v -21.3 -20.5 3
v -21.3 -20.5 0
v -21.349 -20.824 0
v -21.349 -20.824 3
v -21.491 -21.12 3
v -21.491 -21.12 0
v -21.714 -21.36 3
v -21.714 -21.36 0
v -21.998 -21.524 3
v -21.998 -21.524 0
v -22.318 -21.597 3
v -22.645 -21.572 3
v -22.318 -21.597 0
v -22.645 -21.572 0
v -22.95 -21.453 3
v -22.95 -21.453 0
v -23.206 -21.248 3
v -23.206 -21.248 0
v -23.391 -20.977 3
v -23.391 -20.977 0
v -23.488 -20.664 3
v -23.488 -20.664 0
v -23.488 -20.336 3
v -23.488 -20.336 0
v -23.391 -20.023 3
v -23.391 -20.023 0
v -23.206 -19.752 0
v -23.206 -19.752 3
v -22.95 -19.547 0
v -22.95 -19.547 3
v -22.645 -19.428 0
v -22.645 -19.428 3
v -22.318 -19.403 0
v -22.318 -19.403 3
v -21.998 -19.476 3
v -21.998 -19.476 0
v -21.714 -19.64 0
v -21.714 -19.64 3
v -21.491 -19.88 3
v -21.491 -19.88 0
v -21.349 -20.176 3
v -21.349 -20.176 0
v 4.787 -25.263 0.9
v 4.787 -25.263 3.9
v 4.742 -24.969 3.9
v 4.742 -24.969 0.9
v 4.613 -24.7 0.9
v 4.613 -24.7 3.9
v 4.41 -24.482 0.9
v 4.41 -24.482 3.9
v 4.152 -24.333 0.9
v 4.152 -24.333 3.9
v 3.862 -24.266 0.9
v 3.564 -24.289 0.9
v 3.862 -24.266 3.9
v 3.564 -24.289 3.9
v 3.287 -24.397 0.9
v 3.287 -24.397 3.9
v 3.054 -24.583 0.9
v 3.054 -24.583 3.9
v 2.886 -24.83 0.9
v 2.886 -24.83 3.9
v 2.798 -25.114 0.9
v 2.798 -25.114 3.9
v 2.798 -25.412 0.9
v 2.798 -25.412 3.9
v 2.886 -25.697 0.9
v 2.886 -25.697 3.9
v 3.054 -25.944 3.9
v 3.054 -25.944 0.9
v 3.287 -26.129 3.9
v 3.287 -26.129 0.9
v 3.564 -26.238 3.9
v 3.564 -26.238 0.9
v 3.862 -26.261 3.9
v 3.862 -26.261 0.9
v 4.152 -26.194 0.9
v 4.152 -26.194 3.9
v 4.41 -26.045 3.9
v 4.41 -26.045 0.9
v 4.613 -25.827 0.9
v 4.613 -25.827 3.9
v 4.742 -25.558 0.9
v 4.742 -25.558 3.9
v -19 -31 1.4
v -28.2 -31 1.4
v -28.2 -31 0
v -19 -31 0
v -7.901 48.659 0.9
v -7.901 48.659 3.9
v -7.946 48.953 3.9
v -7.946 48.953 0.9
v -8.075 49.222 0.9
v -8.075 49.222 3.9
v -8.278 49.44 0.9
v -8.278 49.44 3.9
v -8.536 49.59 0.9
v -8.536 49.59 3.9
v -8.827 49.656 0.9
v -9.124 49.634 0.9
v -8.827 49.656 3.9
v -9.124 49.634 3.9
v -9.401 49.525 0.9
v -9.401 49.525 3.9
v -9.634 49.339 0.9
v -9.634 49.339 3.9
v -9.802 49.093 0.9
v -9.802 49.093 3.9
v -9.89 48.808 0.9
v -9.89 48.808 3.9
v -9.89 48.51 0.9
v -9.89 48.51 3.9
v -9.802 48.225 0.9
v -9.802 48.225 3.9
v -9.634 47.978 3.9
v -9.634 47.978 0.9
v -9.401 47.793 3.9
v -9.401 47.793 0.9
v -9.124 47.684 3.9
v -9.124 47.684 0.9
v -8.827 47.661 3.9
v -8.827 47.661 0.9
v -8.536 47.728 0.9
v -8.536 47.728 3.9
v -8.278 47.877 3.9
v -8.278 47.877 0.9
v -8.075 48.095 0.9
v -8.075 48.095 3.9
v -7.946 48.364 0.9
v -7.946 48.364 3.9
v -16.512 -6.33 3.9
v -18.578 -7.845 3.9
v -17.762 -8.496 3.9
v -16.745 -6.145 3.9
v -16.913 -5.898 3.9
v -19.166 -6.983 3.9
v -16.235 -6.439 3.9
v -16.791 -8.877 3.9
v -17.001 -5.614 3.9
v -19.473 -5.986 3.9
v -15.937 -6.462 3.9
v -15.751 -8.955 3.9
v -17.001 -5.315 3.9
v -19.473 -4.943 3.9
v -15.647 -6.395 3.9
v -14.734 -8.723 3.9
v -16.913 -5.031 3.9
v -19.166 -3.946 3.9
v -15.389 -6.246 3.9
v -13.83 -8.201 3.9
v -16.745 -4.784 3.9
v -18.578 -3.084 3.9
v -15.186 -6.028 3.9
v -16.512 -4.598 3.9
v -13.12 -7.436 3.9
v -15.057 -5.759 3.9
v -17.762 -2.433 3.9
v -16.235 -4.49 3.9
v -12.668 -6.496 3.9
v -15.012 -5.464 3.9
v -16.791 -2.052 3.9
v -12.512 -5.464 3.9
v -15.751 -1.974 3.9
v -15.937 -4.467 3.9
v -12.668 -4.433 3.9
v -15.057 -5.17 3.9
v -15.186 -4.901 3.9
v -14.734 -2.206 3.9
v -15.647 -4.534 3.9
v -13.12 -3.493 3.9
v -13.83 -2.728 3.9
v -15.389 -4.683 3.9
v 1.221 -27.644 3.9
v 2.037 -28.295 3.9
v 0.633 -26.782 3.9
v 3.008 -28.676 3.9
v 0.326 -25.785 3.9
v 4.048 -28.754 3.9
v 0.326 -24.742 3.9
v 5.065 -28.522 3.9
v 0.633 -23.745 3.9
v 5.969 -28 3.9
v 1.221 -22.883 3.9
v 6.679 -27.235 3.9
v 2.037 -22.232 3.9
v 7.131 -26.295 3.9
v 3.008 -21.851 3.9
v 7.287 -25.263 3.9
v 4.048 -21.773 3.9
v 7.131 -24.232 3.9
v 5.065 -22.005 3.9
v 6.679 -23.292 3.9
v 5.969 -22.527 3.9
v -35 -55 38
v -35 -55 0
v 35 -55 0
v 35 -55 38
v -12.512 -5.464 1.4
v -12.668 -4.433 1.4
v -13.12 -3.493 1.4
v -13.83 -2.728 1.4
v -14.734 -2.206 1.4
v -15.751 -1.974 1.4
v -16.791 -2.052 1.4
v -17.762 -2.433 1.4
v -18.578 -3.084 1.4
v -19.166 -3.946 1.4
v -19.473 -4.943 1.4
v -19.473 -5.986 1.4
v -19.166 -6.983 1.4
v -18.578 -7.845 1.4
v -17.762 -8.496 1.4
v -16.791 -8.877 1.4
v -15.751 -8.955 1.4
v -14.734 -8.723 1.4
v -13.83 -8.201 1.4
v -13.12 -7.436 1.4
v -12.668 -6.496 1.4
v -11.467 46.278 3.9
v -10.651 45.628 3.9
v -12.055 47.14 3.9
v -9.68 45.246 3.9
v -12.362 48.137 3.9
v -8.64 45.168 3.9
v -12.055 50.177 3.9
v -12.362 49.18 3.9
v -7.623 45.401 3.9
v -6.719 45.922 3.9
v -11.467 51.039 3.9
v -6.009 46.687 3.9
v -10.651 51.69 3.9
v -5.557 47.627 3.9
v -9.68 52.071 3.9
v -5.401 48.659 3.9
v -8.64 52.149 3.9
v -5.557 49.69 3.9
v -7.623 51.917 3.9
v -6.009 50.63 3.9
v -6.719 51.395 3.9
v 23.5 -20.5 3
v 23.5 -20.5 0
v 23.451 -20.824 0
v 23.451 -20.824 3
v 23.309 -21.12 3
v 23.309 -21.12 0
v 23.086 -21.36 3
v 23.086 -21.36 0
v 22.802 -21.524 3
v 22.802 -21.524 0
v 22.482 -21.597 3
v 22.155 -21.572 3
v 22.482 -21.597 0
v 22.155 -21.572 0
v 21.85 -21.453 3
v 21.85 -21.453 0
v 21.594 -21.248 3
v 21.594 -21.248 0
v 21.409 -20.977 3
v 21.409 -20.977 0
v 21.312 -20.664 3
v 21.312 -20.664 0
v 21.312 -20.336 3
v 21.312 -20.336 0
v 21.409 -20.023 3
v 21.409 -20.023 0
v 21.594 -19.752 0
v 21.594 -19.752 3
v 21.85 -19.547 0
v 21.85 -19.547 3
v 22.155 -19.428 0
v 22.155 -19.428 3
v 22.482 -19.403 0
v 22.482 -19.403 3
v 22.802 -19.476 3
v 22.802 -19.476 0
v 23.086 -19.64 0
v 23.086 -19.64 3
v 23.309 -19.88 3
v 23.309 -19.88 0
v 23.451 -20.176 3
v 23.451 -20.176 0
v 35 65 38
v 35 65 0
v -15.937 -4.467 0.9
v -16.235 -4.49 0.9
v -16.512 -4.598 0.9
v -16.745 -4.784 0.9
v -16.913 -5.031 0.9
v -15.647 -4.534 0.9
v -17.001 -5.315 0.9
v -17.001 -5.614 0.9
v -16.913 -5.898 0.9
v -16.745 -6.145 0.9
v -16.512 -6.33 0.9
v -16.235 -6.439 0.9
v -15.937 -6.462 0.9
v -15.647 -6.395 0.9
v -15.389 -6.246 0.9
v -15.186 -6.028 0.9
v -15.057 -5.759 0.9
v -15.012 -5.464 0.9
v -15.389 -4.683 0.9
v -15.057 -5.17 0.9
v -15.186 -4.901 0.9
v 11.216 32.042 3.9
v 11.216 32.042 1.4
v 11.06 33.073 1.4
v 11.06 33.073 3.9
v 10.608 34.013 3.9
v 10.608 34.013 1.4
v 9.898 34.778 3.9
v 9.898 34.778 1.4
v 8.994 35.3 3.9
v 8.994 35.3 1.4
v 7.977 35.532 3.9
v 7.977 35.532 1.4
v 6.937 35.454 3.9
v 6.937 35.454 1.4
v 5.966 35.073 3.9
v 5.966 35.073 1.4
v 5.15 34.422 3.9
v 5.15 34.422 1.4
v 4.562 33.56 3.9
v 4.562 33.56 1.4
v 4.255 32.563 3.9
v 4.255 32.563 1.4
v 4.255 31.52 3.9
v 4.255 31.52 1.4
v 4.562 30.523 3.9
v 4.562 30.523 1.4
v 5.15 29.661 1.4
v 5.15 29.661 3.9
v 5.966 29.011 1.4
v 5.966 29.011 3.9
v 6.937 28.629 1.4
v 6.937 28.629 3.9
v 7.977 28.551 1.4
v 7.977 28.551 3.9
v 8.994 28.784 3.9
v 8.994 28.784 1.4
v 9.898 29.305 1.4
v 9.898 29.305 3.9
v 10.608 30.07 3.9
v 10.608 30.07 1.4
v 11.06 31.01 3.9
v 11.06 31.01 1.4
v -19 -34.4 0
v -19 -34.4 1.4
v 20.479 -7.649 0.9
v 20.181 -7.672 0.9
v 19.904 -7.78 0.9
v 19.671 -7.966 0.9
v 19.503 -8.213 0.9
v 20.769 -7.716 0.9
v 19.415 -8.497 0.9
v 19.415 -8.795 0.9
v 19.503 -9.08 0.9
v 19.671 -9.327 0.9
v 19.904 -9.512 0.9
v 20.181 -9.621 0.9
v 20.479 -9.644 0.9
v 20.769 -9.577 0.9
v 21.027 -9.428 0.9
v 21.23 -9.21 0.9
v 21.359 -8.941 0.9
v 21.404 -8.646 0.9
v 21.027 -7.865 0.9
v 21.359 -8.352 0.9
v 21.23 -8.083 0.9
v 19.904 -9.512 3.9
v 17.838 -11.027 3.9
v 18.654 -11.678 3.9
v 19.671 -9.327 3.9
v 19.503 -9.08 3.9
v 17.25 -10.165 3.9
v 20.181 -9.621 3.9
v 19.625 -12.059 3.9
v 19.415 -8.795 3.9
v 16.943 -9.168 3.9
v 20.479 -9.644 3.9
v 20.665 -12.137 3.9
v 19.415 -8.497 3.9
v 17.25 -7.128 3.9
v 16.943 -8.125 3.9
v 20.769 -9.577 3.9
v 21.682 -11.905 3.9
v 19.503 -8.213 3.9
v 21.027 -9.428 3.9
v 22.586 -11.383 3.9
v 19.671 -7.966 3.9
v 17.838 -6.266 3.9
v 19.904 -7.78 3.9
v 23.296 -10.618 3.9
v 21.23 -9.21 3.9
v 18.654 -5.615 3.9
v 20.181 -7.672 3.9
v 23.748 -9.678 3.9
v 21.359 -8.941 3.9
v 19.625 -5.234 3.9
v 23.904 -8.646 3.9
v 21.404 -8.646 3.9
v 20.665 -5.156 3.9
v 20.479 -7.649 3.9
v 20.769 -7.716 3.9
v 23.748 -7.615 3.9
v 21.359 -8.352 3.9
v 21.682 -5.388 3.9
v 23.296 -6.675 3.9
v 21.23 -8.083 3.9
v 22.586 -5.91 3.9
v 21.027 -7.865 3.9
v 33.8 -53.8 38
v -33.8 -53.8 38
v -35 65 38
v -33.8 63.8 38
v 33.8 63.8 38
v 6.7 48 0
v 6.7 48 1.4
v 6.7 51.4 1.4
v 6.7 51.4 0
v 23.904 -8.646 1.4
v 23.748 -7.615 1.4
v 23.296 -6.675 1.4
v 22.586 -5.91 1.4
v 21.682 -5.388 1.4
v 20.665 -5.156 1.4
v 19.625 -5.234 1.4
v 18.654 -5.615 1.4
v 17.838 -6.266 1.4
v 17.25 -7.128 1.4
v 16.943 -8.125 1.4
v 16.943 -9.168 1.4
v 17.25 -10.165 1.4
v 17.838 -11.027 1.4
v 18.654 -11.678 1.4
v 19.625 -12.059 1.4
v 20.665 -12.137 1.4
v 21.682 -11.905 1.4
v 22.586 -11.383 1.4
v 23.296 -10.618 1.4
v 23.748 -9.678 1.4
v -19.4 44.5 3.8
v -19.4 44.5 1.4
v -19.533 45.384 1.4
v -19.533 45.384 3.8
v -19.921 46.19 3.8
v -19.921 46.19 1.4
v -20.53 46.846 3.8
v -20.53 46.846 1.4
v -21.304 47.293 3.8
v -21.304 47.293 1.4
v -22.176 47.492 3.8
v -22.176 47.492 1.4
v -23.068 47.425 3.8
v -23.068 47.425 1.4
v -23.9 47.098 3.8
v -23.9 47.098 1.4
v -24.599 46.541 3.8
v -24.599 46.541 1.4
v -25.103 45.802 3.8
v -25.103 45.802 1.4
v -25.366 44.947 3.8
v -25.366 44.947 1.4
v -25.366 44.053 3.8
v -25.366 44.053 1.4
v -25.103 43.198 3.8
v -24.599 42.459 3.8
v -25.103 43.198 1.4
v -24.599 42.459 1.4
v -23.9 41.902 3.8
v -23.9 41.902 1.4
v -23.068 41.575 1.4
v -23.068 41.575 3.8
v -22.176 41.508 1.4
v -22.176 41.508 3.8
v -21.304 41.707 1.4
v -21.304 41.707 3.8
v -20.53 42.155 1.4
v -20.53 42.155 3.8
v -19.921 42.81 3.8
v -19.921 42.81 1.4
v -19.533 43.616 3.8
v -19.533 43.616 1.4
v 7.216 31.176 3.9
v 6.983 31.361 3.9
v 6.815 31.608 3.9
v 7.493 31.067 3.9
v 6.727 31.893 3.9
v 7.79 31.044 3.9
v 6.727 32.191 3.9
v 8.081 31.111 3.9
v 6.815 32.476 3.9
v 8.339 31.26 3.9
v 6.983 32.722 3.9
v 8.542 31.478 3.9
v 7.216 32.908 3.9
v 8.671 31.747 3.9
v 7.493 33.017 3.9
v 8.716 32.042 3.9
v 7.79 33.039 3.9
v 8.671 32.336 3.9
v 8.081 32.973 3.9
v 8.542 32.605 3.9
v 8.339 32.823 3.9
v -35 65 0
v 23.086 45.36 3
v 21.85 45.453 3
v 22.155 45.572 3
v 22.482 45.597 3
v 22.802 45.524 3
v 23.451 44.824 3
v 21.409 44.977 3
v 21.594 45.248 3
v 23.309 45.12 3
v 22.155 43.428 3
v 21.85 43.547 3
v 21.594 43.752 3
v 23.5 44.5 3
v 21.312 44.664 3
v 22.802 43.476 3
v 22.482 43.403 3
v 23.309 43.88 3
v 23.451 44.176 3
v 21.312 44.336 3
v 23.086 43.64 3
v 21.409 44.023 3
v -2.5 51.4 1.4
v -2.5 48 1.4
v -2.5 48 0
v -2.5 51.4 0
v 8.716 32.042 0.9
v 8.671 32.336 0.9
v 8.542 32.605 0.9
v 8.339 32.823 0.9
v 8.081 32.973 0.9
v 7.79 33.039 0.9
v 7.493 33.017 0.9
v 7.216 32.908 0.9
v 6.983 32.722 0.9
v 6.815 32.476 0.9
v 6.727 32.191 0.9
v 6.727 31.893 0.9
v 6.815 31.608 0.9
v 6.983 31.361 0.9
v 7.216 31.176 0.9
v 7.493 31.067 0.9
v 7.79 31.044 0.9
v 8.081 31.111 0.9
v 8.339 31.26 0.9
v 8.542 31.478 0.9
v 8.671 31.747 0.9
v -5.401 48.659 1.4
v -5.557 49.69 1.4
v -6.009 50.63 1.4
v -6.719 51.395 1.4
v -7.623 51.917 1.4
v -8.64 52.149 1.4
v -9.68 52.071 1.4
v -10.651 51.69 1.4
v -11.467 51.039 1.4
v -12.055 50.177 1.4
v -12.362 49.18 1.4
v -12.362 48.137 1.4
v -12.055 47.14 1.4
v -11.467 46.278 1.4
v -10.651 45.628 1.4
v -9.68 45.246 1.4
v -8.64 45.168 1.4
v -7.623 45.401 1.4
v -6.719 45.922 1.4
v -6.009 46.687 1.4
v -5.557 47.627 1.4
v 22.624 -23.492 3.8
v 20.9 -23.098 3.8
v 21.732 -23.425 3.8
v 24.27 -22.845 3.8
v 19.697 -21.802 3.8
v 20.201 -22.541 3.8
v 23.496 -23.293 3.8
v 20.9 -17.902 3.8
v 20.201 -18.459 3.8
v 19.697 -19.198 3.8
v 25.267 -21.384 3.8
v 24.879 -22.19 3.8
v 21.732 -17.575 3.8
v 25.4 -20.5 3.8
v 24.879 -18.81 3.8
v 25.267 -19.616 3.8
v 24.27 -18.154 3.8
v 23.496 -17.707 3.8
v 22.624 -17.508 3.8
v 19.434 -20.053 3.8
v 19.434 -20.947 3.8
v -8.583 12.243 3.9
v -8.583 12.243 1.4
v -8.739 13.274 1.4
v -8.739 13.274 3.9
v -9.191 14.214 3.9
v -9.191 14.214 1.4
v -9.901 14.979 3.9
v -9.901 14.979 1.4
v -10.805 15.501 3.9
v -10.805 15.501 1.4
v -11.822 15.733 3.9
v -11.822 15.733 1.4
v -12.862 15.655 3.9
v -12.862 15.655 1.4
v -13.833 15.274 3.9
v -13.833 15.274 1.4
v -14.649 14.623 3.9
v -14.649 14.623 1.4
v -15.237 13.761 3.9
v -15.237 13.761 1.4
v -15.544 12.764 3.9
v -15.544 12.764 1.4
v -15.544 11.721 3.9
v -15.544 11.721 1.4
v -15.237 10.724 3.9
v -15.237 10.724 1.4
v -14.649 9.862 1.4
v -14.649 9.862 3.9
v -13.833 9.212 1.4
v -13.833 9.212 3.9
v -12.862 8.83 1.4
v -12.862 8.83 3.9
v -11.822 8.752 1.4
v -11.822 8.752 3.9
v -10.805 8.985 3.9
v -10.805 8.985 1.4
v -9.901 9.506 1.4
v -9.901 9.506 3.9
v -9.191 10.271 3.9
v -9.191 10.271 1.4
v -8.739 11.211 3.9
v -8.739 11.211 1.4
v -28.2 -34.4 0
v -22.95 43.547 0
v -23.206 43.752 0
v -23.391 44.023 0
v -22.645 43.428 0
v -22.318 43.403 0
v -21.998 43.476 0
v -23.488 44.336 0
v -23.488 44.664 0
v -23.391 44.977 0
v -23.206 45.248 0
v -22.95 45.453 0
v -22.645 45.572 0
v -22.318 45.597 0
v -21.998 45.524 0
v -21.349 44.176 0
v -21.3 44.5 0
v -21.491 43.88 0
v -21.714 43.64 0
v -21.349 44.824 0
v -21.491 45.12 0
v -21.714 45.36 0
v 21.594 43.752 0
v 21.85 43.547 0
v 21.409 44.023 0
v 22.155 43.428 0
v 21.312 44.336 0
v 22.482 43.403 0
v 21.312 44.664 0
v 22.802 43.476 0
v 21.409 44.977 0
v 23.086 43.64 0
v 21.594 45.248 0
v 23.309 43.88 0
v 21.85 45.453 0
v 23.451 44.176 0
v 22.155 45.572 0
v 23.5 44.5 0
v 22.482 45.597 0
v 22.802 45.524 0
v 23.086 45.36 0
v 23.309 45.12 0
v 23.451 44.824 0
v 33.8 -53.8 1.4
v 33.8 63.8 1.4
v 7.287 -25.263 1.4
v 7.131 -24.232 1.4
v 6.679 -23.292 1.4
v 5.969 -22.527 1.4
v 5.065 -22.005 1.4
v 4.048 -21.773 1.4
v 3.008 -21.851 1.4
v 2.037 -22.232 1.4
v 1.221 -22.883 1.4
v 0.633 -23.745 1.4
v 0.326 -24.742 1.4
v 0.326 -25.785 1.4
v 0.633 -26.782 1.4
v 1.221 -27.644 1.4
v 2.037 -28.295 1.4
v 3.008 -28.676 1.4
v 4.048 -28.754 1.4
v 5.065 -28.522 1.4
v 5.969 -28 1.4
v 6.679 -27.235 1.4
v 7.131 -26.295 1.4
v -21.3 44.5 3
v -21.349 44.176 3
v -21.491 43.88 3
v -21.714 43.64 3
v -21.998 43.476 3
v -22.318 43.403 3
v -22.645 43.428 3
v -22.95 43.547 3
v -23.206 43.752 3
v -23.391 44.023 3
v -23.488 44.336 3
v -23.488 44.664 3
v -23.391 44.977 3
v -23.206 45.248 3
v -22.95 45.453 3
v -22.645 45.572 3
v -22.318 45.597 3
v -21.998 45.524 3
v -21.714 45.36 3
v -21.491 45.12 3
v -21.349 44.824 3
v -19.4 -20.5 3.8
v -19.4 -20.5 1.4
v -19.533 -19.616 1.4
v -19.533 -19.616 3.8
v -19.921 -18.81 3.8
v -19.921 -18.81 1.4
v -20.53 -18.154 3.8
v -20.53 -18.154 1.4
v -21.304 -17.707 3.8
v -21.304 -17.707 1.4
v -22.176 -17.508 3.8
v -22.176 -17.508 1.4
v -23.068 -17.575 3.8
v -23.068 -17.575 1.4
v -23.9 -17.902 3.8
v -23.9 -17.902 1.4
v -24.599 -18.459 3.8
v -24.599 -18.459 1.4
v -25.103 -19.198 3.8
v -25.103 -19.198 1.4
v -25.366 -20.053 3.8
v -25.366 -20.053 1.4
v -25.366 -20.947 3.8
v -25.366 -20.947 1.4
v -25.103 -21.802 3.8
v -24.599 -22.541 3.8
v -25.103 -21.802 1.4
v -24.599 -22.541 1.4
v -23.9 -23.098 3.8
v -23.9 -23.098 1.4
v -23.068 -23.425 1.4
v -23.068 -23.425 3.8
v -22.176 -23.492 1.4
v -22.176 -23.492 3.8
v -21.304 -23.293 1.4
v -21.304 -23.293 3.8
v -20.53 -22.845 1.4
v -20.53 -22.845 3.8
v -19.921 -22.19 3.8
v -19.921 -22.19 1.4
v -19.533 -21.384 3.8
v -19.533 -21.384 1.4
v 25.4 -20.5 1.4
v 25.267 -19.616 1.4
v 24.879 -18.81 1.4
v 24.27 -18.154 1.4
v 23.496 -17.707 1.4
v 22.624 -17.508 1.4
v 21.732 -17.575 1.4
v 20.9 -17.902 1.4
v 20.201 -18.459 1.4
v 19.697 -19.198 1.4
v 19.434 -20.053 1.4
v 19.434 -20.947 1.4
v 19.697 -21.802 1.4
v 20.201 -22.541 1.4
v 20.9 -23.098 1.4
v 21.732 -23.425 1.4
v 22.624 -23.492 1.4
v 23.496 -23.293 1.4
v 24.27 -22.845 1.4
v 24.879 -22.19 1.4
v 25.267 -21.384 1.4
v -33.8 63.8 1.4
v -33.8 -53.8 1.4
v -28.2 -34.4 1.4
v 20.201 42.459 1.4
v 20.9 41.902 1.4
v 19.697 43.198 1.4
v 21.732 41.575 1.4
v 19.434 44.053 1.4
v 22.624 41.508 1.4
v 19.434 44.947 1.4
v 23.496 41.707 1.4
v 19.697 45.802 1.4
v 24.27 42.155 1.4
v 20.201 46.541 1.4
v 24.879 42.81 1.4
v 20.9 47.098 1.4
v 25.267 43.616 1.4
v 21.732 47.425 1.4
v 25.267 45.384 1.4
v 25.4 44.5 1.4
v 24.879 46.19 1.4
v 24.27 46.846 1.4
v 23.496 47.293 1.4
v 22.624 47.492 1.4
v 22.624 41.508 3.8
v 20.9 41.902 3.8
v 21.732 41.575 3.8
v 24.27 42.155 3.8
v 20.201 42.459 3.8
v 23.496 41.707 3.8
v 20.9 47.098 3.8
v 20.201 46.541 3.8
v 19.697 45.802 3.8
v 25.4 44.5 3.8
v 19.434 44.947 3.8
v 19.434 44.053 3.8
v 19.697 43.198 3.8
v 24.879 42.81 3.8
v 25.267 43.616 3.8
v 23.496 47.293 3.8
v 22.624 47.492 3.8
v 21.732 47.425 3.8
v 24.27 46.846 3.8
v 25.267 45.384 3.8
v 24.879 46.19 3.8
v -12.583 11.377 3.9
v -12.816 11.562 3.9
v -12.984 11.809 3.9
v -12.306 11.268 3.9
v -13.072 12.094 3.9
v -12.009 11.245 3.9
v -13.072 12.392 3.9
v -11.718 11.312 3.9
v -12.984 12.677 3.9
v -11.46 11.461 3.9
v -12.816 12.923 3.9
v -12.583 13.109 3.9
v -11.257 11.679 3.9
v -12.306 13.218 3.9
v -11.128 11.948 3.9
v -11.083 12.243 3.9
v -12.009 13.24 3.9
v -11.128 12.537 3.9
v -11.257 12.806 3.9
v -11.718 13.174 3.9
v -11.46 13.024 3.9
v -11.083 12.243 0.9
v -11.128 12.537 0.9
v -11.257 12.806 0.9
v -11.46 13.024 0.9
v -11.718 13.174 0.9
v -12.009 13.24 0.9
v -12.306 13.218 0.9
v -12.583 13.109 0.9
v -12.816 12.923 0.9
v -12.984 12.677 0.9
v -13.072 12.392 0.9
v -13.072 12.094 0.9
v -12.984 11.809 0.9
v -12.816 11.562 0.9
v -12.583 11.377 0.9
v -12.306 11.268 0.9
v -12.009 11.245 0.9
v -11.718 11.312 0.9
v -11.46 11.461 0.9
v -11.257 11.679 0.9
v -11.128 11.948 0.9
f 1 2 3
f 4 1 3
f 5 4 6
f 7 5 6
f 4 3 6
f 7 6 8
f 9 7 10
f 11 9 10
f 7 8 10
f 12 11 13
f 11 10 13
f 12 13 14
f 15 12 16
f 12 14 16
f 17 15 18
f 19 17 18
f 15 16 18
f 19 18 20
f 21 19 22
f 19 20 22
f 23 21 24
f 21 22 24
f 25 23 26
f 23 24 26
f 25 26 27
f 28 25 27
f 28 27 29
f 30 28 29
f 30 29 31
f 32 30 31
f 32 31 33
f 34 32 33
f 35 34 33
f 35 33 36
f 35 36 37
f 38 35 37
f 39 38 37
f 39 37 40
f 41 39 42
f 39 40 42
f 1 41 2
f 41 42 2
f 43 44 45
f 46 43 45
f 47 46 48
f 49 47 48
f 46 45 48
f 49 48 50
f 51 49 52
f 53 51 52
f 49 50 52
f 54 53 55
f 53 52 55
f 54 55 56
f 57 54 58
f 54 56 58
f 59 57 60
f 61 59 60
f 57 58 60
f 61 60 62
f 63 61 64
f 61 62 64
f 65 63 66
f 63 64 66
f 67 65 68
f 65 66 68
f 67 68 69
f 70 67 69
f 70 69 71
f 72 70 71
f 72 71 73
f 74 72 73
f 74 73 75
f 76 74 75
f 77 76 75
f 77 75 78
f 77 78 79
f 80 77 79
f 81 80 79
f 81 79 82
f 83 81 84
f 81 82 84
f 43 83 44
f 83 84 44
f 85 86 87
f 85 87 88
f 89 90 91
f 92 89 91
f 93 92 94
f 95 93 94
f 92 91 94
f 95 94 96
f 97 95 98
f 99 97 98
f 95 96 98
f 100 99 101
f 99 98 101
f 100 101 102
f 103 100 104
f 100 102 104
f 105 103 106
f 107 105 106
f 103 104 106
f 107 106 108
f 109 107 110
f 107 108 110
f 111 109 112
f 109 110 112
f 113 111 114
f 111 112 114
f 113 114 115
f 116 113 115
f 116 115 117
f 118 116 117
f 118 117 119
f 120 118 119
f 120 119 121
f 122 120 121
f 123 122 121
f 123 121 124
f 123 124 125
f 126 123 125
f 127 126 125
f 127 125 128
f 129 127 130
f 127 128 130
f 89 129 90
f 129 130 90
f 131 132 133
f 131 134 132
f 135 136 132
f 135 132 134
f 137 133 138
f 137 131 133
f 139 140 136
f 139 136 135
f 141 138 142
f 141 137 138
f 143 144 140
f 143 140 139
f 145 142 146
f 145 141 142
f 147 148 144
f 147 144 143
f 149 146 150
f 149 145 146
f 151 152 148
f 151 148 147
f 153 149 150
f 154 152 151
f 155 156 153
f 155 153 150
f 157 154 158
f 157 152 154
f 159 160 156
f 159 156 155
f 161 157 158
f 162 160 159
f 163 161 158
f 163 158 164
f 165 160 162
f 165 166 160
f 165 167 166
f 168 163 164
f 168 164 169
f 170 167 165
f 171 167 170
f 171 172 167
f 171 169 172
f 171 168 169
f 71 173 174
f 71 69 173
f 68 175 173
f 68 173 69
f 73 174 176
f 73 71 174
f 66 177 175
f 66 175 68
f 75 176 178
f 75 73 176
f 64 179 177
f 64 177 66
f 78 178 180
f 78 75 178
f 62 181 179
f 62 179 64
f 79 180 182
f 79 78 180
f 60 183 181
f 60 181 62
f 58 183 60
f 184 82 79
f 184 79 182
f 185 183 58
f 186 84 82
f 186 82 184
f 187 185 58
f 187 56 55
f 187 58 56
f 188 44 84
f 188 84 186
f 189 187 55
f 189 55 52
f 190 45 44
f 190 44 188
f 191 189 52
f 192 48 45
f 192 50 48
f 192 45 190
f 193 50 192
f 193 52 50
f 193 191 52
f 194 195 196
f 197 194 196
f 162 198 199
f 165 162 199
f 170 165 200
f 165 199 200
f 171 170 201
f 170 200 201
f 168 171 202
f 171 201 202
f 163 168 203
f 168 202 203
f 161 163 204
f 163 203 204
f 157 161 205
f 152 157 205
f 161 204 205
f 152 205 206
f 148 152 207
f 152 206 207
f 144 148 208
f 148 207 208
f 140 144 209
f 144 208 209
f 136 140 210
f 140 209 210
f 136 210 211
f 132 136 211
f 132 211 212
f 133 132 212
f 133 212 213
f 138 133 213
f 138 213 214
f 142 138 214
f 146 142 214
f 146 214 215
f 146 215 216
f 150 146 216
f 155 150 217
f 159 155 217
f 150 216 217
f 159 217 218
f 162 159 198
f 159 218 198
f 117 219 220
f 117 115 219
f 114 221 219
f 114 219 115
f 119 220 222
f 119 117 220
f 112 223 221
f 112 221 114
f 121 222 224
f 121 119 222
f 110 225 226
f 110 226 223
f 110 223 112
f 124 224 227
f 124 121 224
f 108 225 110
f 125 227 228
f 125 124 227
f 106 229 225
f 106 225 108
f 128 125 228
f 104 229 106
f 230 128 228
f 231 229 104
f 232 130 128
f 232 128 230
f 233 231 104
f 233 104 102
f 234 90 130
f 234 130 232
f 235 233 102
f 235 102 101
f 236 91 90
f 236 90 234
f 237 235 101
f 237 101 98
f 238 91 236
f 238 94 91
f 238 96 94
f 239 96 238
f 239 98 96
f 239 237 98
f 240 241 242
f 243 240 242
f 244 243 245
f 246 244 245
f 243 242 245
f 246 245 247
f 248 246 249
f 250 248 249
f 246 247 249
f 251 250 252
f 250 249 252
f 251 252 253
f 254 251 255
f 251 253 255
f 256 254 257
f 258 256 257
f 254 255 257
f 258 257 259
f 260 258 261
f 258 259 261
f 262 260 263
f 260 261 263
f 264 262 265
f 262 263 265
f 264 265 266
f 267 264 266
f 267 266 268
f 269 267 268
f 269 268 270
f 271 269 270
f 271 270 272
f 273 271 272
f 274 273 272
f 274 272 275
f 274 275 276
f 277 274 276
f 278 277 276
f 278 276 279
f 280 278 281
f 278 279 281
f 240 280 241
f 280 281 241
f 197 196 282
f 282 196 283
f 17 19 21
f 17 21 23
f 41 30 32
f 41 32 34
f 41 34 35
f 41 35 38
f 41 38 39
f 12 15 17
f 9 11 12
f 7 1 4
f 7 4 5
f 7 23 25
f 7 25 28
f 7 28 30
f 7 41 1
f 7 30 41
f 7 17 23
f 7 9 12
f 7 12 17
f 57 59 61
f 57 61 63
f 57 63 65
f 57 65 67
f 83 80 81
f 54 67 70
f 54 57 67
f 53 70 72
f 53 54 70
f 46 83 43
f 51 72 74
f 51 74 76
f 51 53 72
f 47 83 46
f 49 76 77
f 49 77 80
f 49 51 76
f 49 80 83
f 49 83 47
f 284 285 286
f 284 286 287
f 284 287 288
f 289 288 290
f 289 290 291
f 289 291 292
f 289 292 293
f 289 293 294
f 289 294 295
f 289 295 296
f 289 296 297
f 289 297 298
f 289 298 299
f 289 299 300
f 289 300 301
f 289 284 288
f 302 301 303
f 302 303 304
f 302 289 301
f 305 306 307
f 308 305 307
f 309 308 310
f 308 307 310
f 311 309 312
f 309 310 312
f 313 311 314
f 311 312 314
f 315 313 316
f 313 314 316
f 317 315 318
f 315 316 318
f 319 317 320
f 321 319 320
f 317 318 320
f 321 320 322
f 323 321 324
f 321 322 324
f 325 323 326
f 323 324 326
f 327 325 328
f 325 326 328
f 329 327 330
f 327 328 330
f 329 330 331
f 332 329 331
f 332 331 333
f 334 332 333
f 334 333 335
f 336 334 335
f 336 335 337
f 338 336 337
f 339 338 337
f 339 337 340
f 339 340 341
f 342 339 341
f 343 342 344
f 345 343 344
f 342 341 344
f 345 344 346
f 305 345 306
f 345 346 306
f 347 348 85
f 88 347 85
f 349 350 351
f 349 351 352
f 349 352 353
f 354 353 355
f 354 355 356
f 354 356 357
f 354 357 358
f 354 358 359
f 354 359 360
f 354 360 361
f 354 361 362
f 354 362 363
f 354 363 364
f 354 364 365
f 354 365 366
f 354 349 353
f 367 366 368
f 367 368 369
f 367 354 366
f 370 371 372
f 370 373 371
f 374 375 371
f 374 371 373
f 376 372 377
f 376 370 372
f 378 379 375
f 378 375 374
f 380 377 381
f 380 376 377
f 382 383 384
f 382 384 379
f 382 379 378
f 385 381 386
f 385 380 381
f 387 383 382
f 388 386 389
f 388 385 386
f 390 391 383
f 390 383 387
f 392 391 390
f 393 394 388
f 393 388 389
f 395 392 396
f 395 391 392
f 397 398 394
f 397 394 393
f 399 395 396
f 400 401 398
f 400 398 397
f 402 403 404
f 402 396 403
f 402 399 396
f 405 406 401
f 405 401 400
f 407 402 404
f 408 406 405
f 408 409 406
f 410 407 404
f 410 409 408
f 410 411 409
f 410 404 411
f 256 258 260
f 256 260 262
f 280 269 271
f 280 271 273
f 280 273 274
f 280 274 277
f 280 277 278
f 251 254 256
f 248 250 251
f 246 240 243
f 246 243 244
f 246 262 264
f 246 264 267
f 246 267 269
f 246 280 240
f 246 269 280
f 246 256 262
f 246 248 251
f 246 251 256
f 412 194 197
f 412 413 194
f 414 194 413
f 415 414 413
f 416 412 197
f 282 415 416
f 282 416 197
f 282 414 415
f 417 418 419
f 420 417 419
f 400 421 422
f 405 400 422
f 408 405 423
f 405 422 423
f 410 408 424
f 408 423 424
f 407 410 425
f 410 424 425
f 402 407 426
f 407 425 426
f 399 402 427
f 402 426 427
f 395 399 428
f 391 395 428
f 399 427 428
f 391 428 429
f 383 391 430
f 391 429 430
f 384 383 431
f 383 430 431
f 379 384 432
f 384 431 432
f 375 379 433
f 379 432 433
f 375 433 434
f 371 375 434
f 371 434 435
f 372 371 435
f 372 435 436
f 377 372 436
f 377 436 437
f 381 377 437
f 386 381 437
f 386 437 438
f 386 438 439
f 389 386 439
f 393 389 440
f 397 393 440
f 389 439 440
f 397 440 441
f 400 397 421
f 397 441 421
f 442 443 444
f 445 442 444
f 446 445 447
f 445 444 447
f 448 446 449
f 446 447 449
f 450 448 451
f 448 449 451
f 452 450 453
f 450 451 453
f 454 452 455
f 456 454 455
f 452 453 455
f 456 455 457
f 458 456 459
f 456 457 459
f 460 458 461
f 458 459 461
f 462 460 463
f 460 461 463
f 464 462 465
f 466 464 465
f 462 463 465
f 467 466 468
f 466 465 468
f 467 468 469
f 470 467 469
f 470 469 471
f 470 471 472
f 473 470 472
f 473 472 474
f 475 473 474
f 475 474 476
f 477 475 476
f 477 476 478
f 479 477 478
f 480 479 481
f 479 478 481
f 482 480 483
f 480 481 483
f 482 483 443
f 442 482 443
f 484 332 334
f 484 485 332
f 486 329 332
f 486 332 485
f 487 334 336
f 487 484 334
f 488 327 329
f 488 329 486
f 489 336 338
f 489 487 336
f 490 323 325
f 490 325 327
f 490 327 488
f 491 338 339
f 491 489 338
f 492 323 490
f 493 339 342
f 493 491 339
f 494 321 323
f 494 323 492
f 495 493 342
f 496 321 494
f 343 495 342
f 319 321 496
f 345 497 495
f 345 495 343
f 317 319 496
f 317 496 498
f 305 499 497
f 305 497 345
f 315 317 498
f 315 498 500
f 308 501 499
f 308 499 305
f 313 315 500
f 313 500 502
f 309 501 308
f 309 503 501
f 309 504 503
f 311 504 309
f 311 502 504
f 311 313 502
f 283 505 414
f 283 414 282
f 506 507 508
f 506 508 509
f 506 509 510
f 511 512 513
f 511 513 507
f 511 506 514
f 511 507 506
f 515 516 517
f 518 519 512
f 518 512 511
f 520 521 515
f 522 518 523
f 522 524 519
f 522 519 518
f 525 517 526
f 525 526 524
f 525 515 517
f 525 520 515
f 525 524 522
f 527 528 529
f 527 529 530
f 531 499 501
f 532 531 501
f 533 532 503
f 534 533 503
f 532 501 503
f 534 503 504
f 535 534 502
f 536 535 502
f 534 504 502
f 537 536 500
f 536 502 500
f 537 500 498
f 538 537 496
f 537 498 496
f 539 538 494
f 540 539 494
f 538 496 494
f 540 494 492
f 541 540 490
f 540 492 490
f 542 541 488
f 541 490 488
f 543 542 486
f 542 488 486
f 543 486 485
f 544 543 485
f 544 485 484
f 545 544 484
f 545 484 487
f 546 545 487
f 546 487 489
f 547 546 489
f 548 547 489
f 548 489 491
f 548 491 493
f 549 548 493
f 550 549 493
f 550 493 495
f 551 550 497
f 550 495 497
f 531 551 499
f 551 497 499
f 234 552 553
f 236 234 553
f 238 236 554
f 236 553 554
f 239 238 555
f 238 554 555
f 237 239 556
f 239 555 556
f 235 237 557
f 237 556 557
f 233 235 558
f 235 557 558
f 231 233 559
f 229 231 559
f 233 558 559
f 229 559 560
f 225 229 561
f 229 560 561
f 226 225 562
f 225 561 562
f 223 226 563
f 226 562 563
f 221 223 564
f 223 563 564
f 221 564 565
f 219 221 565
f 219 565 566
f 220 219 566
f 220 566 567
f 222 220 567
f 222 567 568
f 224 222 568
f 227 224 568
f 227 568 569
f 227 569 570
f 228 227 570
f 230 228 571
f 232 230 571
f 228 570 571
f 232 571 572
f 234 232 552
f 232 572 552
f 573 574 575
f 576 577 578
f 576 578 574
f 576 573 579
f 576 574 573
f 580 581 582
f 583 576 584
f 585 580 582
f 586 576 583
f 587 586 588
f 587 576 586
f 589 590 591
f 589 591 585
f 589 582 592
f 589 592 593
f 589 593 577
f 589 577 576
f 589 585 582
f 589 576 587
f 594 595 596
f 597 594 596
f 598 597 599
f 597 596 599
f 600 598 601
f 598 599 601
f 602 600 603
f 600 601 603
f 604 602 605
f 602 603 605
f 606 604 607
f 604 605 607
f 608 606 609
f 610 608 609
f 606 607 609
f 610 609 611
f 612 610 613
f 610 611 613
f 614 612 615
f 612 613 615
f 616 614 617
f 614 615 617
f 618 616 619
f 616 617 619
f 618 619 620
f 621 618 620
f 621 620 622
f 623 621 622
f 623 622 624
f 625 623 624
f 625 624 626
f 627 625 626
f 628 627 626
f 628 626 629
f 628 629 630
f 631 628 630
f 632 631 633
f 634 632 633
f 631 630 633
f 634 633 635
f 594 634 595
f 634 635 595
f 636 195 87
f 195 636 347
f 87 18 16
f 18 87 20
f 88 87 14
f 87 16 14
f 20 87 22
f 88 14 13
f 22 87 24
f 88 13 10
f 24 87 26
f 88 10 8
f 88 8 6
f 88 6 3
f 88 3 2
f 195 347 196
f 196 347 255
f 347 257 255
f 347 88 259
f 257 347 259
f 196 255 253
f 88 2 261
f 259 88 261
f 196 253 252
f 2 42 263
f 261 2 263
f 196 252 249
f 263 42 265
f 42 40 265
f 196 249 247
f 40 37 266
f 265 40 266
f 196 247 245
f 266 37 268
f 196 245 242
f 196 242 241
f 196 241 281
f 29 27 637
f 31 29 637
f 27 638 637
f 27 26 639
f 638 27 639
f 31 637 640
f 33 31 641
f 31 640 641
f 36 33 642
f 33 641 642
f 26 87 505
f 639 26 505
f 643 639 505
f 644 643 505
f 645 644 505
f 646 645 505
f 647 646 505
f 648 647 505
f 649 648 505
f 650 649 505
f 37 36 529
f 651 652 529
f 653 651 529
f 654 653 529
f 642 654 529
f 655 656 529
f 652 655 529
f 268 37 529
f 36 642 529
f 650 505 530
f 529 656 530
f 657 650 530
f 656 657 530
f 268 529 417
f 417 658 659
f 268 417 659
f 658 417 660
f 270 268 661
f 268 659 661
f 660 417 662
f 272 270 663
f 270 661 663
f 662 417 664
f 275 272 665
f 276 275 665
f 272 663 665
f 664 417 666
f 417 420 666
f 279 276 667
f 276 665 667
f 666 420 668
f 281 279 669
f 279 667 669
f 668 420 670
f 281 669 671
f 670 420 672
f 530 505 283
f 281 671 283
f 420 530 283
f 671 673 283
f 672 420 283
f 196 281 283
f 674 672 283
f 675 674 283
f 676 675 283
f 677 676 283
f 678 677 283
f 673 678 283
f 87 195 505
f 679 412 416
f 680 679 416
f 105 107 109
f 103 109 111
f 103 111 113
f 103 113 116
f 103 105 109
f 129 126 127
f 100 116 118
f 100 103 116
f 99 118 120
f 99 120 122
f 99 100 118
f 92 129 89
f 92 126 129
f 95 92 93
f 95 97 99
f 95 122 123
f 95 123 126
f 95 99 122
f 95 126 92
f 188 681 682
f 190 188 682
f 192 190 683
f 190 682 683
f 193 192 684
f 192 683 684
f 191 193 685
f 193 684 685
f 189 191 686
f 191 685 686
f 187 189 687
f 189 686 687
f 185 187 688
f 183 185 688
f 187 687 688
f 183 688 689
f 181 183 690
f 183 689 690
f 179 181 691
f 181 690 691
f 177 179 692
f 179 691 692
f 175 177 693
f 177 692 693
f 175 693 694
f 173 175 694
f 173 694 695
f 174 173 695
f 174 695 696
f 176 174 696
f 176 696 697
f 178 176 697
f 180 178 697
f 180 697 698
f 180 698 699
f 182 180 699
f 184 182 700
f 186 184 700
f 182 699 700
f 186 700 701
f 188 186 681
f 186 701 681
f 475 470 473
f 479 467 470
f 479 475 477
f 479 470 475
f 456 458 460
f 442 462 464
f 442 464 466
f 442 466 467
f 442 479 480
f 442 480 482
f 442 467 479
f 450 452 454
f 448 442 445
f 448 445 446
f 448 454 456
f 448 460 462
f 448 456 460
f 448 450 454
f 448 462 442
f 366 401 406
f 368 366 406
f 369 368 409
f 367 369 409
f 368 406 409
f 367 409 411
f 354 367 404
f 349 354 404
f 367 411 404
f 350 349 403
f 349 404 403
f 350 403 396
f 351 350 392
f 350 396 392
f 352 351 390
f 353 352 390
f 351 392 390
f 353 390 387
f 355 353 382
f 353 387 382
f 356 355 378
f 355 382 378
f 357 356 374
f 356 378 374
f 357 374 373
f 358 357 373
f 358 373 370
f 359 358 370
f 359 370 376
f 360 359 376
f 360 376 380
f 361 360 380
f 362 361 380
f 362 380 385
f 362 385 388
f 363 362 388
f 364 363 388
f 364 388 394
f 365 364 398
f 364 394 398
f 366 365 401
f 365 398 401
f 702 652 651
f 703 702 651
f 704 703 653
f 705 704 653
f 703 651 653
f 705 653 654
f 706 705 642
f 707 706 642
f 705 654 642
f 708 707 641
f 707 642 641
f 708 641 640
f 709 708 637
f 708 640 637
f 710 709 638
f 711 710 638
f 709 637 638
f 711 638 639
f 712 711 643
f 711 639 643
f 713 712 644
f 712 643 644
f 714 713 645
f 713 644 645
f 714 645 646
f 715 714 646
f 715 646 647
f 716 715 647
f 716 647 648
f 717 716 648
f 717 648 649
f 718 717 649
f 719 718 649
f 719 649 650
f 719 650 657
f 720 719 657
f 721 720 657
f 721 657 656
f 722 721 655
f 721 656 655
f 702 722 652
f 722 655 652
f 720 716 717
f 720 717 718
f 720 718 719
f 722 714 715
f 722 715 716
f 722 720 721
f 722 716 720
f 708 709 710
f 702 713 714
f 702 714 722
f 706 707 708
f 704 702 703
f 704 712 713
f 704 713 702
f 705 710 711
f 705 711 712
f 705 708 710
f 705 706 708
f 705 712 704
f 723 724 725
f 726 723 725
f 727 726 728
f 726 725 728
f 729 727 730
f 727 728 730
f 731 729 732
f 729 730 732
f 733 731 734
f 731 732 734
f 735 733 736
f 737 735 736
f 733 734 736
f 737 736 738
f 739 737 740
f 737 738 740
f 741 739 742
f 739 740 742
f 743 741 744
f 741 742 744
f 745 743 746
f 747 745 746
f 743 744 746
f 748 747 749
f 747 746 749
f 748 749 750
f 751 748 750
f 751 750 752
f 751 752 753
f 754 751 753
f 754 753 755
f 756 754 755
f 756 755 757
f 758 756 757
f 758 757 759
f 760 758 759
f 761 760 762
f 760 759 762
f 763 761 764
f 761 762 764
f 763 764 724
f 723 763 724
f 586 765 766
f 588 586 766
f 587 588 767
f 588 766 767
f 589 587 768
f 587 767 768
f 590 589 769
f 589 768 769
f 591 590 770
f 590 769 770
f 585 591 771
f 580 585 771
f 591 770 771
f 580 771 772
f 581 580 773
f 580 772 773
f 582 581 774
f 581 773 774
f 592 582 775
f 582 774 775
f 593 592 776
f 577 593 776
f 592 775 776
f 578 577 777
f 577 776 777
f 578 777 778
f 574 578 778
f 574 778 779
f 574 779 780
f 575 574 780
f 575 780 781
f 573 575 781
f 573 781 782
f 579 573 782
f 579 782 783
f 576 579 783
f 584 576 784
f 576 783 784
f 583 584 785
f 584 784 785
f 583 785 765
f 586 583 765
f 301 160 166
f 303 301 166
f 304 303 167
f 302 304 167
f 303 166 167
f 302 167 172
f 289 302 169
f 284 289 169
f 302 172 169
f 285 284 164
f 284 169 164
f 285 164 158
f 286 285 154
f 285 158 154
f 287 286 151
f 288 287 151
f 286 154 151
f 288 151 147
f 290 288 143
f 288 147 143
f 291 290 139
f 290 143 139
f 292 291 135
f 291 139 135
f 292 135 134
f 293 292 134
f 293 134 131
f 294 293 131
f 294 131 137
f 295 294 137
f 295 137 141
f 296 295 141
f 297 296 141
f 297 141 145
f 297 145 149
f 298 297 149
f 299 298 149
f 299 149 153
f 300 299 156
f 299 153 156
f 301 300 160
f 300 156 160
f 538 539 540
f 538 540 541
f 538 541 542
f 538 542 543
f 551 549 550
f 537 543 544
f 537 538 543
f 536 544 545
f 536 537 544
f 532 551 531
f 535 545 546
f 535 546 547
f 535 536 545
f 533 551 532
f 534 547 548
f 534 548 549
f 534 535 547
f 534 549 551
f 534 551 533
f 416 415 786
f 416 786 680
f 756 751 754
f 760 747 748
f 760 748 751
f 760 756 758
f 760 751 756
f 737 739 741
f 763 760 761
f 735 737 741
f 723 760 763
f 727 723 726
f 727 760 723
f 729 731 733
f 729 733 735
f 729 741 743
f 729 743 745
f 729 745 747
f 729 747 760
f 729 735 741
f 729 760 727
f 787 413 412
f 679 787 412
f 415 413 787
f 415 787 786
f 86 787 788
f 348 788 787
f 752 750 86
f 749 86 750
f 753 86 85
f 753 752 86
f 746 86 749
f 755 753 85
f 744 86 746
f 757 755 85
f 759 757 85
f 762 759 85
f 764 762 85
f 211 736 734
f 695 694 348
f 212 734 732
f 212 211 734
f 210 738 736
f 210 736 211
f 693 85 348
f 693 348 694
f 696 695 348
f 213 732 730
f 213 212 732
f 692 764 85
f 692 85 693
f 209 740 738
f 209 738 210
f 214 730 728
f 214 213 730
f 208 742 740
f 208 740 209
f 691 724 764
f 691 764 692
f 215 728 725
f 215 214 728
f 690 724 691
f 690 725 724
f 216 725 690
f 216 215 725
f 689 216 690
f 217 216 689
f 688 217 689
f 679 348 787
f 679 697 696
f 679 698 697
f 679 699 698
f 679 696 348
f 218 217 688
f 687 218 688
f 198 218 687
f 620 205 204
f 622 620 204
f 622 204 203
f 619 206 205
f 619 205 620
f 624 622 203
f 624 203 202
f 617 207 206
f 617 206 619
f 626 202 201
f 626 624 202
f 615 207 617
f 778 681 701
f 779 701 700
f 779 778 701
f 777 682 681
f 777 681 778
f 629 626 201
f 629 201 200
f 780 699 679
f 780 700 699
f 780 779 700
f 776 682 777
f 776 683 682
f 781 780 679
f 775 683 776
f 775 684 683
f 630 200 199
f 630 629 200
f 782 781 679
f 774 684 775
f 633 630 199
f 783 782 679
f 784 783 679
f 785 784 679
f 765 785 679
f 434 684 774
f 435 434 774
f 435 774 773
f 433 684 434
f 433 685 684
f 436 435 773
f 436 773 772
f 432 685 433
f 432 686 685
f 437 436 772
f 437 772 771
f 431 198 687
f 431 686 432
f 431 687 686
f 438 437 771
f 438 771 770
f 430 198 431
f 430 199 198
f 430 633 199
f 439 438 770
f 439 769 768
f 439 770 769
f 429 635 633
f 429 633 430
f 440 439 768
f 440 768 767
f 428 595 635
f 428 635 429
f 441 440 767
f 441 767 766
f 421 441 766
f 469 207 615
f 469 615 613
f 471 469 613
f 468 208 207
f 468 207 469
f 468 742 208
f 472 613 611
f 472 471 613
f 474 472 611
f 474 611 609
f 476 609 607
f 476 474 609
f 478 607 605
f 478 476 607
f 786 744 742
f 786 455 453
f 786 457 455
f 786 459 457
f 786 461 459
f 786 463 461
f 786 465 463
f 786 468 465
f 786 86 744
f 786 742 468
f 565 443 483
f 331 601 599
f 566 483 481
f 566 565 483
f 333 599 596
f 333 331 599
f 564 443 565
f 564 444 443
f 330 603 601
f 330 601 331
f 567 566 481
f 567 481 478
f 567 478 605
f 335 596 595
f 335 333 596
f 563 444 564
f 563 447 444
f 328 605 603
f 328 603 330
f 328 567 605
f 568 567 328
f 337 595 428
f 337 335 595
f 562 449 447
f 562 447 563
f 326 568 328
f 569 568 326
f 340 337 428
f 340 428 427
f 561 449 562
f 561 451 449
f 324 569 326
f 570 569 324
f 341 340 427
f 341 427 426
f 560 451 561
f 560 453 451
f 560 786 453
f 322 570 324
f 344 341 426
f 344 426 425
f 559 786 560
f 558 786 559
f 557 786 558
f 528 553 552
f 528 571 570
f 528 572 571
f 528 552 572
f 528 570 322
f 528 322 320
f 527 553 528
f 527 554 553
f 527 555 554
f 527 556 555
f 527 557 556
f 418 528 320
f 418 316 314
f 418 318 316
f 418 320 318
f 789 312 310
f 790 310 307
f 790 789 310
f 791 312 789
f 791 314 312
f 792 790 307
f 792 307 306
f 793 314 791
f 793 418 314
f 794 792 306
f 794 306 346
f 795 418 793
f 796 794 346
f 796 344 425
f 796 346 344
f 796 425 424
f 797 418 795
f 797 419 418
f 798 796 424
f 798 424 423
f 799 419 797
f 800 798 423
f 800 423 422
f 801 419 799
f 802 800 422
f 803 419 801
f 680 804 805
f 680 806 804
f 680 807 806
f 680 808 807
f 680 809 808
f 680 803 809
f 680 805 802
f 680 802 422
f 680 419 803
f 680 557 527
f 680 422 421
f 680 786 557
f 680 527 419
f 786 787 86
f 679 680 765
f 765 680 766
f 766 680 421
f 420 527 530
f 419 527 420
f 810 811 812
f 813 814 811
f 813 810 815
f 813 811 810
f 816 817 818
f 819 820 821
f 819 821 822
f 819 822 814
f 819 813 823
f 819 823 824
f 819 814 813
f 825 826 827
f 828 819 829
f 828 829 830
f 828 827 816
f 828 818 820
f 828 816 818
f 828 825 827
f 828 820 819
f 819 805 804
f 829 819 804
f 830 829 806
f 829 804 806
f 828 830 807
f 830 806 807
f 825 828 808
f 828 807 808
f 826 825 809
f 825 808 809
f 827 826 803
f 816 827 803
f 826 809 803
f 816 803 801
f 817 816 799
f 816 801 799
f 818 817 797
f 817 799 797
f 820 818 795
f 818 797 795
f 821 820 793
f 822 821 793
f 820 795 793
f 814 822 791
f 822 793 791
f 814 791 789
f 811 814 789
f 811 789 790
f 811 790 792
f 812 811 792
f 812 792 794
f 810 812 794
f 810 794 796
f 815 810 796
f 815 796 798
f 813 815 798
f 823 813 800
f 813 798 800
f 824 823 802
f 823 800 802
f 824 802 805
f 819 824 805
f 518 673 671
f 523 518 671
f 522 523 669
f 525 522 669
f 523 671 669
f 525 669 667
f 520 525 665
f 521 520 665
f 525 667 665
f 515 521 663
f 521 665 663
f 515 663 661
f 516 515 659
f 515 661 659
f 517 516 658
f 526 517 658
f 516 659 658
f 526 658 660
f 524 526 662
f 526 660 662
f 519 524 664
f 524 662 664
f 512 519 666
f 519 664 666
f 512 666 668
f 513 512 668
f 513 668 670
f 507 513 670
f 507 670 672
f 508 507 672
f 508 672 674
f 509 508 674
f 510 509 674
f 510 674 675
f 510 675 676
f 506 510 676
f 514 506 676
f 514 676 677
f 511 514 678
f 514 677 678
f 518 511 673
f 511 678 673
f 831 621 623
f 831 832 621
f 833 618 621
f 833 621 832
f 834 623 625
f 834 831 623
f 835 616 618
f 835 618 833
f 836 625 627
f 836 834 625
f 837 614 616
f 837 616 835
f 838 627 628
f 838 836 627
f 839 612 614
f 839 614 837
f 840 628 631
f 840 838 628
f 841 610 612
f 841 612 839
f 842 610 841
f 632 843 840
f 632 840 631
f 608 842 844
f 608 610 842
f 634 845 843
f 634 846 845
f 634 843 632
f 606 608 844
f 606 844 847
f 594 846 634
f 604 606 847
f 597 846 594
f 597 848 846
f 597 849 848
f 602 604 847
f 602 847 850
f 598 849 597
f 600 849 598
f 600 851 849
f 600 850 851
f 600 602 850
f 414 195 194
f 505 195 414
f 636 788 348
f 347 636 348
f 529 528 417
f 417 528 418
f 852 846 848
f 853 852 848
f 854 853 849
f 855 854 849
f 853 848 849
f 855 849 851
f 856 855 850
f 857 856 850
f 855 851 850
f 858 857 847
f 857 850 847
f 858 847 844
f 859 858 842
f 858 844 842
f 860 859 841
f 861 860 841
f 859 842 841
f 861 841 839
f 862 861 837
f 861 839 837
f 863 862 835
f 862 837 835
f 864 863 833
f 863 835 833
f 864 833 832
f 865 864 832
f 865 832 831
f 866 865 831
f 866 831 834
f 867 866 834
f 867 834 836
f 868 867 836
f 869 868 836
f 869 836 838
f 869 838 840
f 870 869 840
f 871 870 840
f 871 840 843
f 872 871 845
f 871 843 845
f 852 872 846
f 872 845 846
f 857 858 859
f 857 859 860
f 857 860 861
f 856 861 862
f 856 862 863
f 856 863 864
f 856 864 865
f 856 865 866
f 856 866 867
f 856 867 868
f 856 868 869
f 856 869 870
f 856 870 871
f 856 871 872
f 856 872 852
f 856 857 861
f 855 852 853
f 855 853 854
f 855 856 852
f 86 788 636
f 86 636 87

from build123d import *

# Parameters (mm, degrees)
SKETCH_W        = 70
SKETCH_H        = 120
PAD_DEPTH       = 38
SKETCH001_W     = 67.6
SKETCH001_H     = 117.6
POCKET_DEPTH    = 36.6
SKETCH112_R     = 3
PAD080_DEPTH    = 2.4
SKETCH113_R     = 1.1
POCKET031_DEPTH = 3
SKETCH136_R     = 3.5
PAD096_DEPTH    = 2.5
SKETCH137_R     = 1
POCKET039_DEPTH = 3
SKETCH138_W     = 9.2
SKETCH138_H     = 3.4
POCKET040_DEPTH = 1.401


with BuildPart() as part:
    # Sketch → Pad (new body)
    with BuildSketch(Plane.XY):
        Rectangle(SKETCH_W, SKETCH_H)
    extrude(amount=PAD_DEPTH)

    # Sketch001 (on DatumPlane) → Pocket (cut)
    with BuildSketch(Plane.XY.offset(38)):
        Rectangle(SKETCH001_W, SKETCH001_H)
    extrude(amount=-POCKET_DEPTH, mode=Mode.SUBTRACT)

    # Sketch112 → Pad080 (join)
    with BuildSketch(Plane.XY.offset(1.4)):
        with Locations((22.4, 39.500007)):
            Circle(SKETCH112_R)
        with Locations((-22.4, 39.500007)):
            Circle(SKETCH112_R)
        with Locations((-22.4, -25.499993)):
            Circle(SKETCH112_R)
        with Locations((22.4, -25.499993)):
            Circle(SKETCH112_R)
    extrude(amount=PAD080_DEPTH)

    # Sketch113 (on Face4 of Pad080) → Pocket031 (cut)
    with BuildSketch(Plane(origin=(0, 0, 0), x_dir=(1, 0, 0), z_dir=(0, 0, -1))):
        with Locations((22.4, -39.500007)):
            Circle(SKETCH113_R)
        with Locations((-22.4, -39.500007)):
            Circle(SKETCH113_R)
        with Locations((22.4, 25.499993)):
            Circle(SKETCH113_R)
        with Locations((-22.4, 25.499993)):
            Circle(SKETCH113_R)
    extrude(amount=-POCKET031_DEPTH, mode=Mode.SUBTRACT)

    # Sketch136 (on Face11 of Pad080) → Pad096 (join)
    with BuildSketch(Plane.XY.offset(1.4)):
        with Locations((20.403804, -13.646444)):
            Circle(SKETCH136_R)
        with Locations((-16.012195, -10.464463)):
            Circle(SKETCH136_R)
        with Locations((3.786795, -30.263453)):
            Circle(SKETCH136_R)
        with Locations((-8.901281, 43.65864)):
            Circle(SKETCH136_R)
        with Locations((7.715729, 27.041631)):
            Circle(SKETCH136_R)
        with Locations((-12.083261, 7.242641)):
            Circle(SKETCH136_R)
    extrude(amount=PAD096_DEPTH)

    # Sketch137 (on Face37 of Pad096) → Pocket039 (cut)
    with BuildSketch(Plane.XY.offset(3.9)):
        with Locations((-8.901281, 43.65864)):
            Circle(SKETCH137_R)
        with Locations((7.715729, 27.041631)):
            Circle(SKETCH137_R)
        with Locations((-12.083261, 7.242641)):
            Circle(SKETCH137_R)
        with Locations((-16.012195, -10.464463)):
            Circle(SKETCH137_R)
        with Locations((20.403804, -13.646444)):
            Circle(SKETCH137_R)
        with Locations((3.786795, -30.263453)):
            Circle(SKETCH137_R)
    extrude(amount=-POCKET039_DEPTH, mode=Mode.SUBTRACT)

    # Sketch138 (on Face19 of Pocket039) → Pocket040 (cut, through all)
    with BuildSketch(Plane.XY.offset(1.4)):
        with Locations((2.1, 44.7)):
            Rectangle(SKETCH138_W, SKETCH138_H)
        with Locations((-23.6, -37.7)):
            Rectangle(SKETCH138_W, SKETCH138_H)
    extrude(amount=-POCKET040_DEPTH, mode=Mode.SUBTRACT)


with BuildPart() as part_1:
    # Body placement: moved
    add(part.part.moved(Location((0, 5, 0))))


solid = part_1.part
